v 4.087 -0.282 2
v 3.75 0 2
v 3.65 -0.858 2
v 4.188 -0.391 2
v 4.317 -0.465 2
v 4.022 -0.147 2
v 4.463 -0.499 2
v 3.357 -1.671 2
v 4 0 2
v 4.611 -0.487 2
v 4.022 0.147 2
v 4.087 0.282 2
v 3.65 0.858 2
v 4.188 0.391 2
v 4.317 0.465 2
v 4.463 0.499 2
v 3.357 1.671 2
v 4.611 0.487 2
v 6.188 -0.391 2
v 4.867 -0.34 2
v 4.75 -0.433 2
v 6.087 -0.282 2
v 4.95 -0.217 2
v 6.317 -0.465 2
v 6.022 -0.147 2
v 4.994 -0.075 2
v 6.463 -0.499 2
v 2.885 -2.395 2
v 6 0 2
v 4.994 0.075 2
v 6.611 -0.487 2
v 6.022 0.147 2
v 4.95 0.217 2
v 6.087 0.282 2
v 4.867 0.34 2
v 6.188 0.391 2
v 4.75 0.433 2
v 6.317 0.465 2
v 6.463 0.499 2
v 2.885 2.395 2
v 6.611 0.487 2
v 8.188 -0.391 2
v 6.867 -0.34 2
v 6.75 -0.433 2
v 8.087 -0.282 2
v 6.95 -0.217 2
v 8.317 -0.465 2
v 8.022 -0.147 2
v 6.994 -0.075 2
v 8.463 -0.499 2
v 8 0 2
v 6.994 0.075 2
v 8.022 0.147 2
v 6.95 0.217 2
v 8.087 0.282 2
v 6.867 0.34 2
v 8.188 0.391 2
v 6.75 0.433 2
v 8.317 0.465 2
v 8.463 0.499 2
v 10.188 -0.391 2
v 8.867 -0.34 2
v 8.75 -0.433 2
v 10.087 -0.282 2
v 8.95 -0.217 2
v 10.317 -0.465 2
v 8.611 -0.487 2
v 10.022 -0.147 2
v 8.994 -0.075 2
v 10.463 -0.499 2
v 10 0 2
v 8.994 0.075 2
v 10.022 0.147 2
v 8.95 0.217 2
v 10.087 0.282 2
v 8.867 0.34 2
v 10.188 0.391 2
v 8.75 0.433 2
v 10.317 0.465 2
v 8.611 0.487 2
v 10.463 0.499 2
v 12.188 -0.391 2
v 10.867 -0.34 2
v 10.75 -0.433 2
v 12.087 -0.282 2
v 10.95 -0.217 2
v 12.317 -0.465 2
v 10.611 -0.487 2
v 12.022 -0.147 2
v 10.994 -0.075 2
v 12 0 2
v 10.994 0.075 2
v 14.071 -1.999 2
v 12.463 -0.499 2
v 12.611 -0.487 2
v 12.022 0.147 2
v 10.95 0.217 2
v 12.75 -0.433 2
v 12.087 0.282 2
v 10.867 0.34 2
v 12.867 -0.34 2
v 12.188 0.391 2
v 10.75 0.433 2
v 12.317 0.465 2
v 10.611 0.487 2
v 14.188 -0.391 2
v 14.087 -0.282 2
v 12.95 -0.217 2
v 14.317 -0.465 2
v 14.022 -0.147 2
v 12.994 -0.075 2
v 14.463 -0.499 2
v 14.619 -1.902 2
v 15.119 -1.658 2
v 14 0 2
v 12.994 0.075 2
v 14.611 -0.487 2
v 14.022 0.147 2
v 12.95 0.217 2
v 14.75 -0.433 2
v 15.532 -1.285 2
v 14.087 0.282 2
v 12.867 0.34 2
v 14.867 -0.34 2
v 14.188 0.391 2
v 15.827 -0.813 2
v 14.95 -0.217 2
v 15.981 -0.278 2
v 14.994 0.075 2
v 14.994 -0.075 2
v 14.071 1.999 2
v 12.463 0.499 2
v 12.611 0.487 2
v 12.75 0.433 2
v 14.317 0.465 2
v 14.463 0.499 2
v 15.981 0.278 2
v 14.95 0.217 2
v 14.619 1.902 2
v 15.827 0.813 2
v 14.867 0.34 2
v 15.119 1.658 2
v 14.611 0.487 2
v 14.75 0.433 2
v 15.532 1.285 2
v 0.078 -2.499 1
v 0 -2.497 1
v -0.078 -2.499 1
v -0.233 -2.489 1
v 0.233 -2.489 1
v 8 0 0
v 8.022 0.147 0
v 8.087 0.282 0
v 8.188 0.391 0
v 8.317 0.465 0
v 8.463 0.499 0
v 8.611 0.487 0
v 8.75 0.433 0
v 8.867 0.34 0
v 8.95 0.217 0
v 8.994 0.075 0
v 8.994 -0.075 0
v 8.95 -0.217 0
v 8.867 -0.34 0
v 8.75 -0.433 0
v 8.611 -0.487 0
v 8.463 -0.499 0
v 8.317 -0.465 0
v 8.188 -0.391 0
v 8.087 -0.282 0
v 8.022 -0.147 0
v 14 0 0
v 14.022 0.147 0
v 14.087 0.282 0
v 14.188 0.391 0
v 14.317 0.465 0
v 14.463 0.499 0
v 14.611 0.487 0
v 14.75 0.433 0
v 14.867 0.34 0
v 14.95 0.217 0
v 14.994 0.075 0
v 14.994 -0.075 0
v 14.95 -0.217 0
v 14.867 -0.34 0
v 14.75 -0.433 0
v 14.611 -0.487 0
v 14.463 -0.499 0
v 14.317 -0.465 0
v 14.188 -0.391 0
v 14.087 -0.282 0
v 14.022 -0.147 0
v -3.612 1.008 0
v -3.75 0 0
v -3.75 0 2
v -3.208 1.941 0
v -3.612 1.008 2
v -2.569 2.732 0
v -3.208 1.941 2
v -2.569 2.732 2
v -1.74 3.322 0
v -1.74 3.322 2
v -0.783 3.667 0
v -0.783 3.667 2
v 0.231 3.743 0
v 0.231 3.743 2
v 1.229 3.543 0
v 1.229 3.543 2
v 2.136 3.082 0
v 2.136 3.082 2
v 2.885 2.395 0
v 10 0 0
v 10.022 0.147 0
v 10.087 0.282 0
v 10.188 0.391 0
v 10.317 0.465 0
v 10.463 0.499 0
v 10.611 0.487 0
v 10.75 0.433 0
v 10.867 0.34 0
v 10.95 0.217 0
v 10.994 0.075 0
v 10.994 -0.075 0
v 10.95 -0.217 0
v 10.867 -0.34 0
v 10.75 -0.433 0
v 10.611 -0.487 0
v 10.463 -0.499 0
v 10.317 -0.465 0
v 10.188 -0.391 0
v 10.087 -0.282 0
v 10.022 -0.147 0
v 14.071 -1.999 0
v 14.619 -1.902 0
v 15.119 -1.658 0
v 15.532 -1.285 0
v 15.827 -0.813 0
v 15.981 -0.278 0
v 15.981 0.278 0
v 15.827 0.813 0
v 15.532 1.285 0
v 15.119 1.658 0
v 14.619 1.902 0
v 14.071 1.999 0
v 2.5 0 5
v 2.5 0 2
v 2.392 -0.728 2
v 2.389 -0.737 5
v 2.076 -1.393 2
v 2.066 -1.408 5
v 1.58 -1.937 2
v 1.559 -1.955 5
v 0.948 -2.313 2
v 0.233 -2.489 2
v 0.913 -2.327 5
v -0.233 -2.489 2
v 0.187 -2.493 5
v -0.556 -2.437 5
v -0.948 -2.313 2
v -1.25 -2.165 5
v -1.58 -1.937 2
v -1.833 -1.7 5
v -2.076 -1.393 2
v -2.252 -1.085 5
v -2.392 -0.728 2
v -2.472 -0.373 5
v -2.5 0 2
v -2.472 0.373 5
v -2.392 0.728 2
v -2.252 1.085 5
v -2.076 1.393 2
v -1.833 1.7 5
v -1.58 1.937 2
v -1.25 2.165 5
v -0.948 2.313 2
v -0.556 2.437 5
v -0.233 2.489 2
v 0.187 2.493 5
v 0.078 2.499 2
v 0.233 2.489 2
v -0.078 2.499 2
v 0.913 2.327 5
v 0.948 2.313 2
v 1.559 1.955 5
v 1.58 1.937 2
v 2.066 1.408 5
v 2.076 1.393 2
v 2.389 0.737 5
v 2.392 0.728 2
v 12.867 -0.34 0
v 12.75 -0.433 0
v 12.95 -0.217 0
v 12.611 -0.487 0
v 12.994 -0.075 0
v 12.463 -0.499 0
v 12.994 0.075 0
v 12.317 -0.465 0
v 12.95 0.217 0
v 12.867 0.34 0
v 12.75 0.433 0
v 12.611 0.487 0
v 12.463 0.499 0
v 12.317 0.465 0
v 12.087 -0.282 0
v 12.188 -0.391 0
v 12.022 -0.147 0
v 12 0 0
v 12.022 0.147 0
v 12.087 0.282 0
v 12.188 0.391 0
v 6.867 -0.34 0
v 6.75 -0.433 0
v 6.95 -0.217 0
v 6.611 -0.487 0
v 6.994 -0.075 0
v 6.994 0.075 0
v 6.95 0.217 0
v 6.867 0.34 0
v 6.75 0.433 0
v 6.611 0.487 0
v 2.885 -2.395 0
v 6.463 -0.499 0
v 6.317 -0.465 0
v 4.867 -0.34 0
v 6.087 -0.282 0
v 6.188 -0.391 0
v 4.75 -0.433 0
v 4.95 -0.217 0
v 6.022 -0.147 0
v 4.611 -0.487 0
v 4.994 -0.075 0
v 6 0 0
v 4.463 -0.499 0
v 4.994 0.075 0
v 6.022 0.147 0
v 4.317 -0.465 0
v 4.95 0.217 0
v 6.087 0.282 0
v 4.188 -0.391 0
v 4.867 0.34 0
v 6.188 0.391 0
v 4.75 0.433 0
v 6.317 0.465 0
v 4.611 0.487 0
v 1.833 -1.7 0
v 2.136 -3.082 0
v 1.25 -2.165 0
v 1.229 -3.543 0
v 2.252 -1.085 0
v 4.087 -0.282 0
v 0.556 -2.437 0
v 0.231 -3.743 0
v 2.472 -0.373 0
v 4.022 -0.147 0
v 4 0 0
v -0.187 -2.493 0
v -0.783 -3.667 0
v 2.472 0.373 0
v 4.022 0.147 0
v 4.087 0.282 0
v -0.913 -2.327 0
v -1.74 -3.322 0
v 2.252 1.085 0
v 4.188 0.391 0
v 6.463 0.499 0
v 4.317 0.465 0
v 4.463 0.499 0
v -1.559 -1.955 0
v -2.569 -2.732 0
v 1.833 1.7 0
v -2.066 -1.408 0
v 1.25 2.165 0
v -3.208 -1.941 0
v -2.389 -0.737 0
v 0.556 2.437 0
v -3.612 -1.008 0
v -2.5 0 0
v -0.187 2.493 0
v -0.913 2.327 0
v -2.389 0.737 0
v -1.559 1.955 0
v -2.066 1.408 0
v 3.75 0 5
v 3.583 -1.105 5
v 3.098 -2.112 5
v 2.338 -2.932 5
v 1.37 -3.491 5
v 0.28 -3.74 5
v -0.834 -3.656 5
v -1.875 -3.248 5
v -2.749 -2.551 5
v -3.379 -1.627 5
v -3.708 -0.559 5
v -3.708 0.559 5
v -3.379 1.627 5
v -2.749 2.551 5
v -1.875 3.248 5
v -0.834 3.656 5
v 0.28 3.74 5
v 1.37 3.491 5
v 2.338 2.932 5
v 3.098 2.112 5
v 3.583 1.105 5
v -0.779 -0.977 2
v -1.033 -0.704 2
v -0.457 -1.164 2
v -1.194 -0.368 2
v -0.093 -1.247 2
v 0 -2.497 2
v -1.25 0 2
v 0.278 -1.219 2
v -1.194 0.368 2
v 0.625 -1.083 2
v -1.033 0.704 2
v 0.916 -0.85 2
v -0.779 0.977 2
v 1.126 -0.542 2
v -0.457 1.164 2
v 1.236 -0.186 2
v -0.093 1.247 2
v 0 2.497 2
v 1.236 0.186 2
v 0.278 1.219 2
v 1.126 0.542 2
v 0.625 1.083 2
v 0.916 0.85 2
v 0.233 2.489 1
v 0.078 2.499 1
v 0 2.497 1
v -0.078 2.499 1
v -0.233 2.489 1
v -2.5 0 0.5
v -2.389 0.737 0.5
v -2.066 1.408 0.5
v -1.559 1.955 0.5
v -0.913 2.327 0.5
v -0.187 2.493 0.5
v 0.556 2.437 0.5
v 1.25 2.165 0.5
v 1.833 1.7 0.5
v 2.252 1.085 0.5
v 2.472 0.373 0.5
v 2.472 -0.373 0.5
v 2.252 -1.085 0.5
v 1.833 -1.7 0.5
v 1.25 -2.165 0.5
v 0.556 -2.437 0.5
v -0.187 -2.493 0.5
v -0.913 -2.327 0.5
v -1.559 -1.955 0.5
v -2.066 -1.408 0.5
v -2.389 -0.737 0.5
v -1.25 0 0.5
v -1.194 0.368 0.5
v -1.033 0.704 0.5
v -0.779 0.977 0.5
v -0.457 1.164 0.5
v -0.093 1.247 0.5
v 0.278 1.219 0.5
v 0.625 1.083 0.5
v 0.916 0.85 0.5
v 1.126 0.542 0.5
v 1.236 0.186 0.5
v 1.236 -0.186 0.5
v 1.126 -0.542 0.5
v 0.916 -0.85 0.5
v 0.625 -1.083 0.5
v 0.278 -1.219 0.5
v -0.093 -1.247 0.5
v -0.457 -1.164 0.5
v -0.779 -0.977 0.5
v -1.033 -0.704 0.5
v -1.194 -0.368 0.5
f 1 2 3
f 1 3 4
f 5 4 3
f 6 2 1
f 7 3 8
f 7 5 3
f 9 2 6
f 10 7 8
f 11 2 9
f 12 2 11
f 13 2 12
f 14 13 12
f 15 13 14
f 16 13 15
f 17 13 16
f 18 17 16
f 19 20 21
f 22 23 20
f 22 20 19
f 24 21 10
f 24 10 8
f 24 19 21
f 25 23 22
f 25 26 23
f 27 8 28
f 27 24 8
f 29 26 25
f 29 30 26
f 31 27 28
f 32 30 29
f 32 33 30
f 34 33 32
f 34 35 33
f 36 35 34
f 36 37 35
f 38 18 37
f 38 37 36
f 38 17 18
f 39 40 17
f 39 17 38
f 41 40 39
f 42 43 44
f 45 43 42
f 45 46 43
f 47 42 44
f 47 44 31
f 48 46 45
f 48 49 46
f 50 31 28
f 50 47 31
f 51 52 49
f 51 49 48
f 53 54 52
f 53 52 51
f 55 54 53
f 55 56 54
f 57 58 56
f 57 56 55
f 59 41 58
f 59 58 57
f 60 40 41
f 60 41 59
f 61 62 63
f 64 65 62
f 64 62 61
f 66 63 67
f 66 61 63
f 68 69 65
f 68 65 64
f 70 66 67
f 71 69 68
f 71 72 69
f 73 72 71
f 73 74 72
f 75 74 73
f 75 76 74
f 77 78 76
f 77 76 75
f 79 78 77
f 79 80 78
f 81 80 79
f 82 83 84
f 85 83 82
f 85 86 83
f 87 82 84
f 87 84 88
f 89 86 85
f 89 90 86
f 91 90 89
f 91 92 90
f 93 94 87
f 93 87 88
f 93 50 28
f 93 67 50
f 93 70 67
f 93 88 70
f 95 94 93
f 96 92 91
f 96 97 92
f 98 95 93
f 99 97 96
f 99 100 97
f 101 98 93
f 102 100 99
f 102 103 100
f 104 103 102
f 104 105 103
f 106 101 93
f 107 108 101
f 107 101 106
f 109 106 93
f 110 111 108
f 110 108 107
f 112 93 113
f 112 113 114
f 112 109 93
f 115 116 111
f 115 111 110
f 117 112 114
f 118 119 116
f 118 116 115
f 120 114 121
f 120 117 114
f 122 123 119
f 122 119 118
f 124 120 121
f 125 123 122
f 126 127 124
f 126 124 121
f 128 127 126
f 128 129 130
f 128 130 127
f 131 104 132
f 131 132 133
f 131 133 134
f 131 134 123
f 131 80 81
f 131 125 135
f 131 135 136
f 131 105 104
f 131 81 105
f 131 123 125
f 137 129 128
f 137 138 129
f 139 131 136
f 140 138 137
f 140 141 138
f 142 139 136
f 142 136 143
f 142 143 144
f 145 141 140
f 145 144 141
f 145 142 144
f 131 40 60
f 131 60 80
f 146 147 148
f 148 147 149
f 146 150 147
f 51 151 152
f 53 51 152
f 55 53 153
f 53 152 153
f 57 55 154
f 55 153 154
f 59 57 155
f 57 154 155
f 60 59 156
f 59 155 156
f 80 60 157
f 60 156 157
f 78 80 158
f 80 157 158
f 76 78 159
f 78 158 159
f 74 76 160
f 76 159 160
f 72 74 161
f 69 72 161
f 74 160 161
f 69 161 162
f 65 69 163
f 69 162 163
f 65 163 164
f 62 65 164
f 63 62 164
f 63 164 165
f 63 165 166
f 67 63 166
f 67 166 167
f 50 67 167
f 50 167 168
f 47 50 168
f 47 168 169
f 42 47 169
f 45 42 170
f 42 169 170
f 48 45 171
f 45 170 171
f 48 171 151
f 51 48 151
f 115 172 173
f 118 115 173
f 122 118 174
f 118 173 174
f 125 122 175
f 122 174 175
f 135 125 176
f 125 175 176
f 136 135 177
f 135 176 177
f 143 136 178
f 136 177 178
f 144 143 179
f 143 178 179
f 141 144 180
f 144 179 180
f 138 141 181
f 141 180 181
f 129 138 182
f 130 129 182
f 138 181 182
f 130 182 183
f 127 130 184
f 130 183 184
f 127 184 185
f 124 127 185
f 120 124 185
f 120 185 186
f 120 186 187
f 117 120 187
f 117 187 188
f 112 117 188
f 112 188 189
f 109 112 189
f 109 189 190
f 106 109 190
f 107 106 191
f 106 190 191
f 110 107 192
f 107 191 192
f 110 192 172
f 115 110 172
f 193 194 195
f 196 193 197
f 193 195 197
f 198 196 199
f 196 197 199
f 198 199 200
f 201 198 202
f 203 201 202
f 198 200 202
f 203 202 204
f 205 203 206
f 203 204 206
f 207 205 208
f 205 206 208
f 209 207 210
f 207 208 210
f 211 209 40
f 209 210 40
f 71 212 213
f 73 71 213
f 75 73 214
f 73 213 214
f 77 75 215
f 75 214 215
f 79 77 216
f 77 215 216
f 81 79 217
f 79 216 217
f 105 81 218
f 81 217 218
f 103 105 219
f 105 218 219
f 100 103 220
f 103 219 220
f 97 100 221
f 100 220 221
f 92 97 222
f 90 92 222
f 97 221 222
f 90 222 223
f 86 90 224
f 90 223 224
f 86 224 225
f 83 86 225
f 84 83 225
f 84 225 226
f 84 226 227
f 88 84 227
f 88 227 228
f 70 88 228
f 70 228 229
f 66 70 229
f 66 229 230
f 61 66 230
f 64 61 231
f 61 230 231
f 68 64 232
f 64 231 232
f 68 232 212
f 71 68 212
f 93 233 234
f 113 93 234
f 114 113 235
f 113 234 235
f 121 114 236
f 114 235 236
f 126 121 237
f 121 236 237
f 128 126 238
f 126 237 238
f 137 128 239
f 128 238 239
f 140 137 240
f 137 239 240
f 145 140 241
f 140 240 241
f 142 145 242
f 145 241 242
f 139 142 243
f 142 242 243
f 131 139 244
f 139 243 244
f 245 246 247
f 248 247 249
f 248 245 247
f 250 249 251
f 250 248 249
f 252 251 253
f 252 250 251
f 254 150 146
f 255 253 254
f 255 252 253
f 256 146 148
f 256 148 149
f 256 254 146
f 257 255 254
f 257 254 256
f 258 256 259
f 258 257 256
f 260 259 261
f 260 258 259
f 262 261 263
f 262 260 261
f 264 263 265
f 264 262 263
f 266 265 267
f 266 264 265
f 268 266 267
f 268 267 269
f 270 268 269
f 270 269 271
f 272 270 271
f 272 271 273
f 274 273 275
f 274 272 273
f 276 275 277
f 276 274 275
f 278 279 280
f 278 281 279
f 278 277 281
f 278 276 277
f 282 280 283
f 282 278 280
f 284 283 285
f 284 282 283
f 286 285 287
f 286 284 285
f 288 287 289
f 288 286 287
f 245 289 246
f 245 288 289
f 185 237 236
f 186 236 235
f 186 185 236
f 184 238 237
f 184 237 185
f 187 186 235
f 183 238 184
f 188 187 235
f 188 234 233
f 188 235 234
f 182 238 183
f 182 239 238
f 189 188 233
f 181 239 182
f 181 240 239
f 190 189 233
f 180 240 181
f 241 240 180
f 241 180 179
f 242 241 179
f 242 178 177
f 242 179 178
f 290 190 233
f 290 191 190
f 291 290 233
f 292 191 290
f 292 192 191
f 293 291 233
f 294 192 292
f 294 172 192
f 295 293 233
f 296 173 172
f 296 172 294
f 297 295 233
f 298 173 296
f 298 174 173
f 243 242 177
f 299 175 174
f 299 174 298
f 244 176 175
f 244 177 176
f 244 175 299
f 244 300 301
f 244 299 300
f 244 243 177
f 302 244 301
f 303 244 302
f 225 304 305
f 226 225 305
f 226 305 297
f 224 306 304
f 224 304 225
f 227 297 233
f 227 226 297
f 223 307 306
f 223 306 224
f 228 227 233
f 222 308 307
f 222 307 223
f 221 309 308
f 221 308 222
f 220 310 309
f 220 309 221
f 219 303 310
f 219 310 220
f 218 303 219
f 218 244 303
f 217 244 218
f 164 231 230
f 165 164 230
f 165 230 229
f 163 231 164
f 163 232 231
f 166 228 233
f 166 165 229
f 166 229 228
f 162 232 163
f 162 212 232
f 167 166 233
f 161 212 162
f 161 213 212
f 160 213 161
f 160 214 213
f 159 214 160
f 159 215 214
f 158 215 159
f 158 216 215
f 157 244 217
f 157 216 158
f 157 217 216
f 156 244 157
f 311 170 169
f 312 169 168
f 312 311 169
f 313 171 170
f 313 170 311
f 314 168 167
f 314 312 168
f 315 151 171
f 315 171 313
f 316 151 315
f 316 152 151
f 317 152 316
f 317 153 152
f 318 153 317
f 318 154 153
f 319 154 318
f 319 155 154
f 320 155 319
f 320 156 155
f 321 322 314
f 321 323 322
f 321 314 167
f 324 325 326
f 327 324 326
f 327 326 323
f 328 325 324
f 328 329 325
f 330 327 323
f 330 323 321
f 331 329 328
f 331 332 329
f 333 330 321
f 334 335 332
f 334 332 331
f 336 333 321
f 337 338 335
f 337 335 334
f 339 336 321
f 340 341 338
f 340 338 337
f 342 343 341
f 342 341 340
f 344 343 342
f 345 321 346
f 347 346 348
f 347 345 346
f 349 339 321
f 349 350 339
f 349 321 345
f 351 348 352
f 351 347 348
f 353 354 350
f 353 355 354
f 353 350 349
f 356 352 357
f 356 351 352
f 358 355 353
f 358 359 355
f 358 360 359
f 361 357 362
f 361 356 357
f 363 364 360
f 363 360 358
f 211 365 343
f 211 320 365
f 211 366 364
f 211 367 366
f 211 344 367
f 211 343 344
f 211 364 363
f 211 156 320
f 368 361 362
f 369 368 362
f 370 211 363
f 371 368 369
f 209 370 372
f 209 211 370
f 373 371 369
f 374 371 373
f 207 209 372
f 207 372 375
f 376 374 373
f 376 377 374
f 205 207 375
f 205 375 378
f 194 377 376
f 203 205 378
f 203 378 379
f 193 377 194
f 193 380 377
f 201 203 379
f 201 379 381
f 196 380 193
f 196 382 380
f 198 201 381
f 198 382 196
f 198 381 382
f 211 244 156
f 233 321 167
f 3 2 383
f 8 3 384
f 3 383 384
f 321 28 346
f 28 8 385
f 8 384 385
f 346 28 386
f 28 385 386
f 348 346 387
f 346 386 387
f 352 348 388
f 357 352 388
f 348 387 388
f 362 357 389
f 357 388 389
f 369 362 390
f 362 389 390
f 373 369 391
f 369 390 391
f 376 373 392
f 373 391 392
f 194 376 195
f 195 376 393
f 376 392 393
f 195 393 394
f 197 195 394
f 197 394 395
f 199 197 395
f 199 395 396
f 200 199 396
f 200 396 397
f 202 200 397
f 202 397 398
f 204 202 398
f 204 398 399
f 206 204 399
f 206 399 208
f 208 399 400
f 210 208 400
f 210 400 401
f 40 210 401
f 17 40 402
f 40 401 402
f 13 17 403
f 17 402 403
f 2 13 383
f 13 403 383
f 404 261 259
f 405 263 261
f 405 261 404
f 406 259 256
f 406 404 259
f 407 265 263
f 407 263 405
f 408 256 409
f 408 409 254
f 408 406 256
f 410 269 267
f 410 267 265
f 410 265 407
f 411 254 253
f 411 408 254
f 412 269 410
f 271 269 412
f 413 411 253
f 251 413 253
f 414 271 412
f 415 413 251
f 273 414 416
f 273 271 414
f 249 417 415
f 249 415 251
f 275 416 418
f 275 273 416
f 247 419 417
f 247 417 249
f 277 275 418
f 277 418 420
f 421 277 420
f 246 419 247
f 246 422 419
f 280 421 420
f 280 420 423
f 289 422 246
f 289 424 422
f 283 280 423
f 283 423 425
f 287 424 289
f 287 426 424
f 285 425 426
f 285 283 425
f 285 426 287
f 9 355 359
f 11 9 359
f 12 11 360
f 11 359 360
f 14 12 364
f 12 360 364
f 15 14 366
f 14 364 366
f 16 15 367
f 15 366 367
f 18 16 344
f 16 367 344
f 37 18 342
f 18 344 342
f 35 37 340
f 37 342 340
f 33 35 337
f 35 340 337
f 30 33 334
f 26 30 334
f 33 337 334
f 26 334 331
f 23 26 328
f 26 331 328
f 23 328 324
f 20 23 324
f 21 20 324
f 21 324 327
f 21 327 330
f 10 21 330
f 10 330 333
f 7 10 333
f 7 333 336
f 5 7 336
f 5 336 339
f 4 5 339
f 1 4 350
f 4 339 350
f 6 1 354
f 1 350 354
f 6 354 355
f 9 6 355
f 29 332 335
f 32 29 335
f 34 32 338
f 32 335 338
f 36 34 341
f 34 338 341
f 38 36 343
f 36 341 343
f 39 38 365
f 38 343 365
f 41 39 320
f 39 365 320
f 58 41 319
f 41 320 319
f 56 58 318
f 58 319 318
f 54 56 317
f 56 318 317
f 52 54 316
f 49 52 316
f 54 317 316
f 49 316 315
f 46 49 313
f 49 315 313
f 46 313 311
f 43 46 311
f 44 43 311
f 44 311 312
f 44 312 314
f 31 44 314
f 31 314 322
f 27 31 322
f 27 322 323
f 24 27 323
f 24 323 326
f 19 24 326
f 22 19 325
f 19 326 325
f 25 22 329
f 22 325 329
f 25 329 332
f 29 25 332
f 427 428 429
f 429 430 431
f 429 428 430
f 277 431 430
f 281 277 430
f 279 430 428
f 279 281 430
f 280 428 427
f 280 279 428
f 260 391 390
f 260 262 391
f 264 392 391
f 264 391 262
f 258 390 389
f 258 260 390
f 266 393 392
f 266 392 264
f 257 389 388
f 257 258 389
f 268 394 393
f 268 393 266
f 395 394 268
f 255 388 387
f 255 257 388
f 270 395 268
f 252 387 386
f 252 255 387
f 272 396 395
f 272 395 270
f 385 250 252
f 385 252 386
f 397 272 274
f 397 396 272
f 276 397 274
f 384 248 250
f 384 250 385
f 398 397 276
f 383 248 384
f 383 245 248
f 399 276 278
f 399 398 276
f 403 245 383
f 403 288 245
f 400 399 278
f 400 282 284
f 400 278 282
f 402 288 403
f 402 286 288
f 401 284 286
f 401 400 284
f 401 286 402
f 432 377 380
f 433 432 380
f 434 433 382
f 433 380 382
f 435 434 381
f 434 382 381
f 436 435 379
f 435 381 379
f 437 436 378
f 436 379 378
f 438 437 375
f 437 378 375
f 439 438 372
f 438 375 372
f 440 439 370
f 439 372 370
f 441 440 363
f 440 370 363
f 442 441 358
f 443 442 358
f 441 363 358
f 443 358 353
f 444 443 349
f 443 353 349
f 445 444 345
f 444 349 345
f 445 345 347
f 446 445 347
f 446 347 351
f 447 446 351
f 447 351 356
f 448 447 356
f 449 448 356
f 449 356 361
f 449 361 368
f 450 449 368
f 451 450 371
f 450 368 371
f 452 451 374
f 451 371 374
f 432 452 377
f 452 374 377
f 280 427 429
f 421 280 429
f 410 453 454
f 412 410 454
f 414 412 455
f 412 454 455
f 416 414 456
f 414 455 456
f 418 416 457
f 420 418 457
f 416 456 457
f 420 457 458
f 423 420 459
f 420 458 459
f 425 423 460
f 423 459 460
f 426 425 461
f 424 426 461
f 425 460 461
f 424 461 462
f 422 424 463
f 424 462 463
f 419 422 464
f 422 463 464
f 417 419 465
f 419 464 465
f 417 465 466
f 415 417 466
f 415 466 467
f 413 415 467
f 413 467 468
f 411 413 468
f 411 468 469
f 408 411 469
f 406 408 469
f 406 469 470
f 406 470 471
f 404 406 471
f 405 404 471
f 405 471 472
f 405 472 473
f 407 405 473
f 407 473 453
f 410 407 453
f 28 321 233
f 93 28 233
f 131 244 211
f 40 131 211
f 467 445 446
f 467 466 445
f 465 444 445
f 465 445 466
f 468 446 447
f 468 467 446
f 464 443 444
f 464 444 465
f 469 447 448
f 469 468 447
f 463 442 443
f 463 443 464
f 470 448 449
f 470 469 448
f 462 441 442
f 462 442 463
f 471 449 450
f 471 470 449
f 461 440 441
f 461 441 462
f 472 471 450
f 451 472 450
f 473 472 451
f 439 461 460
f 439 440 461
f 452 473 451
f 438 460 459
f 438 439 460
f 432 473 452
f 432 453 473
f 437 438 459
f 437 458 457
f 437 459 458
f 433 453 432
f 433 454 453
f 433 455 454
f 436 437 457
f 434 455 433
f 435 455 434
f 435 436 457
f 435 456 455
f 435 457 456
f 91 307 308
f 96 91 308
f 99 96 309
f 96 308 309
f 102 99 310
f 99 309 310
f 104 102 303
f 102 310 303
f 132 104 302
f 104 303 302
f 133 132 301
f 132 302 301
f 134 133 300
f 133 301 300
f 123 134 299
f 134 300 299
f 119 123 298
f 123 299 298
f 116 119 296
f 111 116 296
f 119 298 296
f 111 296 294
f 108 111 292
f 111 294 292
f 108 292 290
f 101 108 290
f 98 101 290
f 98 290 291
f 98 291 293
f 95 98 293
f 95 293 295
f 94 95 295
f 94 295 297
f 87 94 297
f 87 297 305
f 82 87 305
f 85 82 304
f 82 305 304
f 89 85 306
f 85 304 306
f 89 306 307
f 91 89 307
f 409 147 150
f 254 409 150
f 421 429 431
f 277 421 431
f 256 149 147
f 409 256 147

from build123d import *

# Parameters (mm, degrees)
EXTRUDE_3_DEPTH     = 2
EXTRUDE_3_2_DEPTH   = 2
SKETCH_2_R          = 3.75
SKETCH_2_R_2        = 2.5
EXTRUDE_5_DEPTH     = 3
SKETCH_3_R          = 3.75
SKETCH_3_R_2        = 2.5
EXTRUDE_6_DEPTH     = 2
SKETCH_4_R          = 0.5
CUT_EXTRUDE_1_DEPTH = 2
SKETCH_5_R          = 2.5
EXTRUDE_7_DEPTH     = 1
SKETCH_6_R          = 2.5
CUT_EXTRUDE_2_DEPTH = 0.5
SKETCH_7_R          = 1.25
CUT_EXTRUDE_3_DEPTH = 5


with BuildPart() as part:
    # Эскиз1 → Бобышка-Вытянуть3 (new body)
    with BuildSketch(Plane.XY):
        with BuildLine():
            ThreePointArc((-0.233236, 2.489096416), (-1.84838984, 1.683286963), (-2.5, 0))
            ThreePointArc((-2.5, 0), (-1.84838984, -1.683286963), (-0.233236, -2.489096416))
            Line((-0.233236, -2.489096416), (0, -2.497361401))
            Line((0, -2.497361401), (0.233236, -2.489096416))
            ThreePointArc((0.233236, -2.489096416), (2.5, 0), (0.233236, 2.489096416))
            Line((0.233236, 2.489096416), (0, 2.497361401))
            Line((0, 2.497361401), (-0.233236, 2.489096416))
        make_face()
    extrude(amount=EXTRUDE_3_DEPTH)



with BuildPart() as body_2:
    # Эскиз1 → Extrude 3 2 (new body)
    with BuildSketch(Plane.XY):
        with BuildLine():
            Line((14.07082784, 1.998745461), (2.88547071, 2.395111434))
            ThreePointArc((2.88547071, 2.395111434), (3.75, 0), (2.88547071, -2.395111434))
            Line((2.88547071, -2.395111434), (14.07082784, -1.998745461))
            ThreePointArc((14.07082784, -1.998745461), (16, 0), (14.07082784, 1.998745461))
        make_face()
    extrude(amount=EXTRUDE_3_2_DEPTH)


with BuildPart() as body_3:
    # Эскиз2 → Бобышка-Вытянуть5 (new body)
    with BuildSketch(Plane.XY.offset(2)):
        Circle(SKETCH_2_R)
        Circle(SKETCH_2_R_2, mode=Mode.SUBTRACT)
    extrude(amount=EXTRUDE_5_DEPTH)


with BuildPart() as part_1:
    add(part.part)

    add(body_2.part)  # Бобышка-Вытянуть6 merges body 2

    add(body_3.part)  # Бобышка-Вытянуть6 merges body 3
    # Эскиз3 → Бобышка-Вытянуть6 (add)
    with BuildSketch(Plane(origin=(0, 0, 2), x_dir=(-1, 0, 0), z_dir=(0, 0, -1))):
        Circle(SKETCH_3_R)
        Circle(SKETCH_3_R_2, mode=Mode.SUBTRACT)
    extrude(amount=EXTRUDE_6_DEPTH)

    # Эскиз4 → Вырез-Вытянуть1 (cut)
    with BuildSketch(Plane(origin=(0, 0, 0), x_dir=(-1, 0, 0), z_dir=(0, 0, -1))):
        with Locations((-14.5, 0)):
            Circle(SKETCH_4_R)
        with Locations((-4.5, 0)):
            Circle(SKETCH_4_R)
        with Locations((-6.5, 0)):
            Circle(SKETCH_4_R)
        with Locations((-8.5, 0)):
            Circle(SKETCH_4_R)
        with Locations((-10.5, 0)):
            Circle(SKETCH_4_R)
        with Locations((-12.5, 0)):
            Circle(SKETCH_4_R)
    extrude(amount=-CUT_EXTRUDE_1_DEPTH, mode=Mode.SUBTRACT)

    # Эскиз5 → Бобышка-Вытянуть7 (add)
    with BuildSketch(Plane(origin=(0, 0, 0), x_dir=(-1, 0, 0), z_dir=(0, 0, -1))):
        Circle(SKETCH_5_R)
    extrude(amount=-EXTRUDE_7_DEPTH)

    # Эскиз6 → Вырез-Вытянуть2 (cut)
    with BuildSketch(Plane(origin=(0, 0, 0), x_dir=(-1, 0, 0), z_dir=(0, 0, -1))):
        Circle(SKETCH_6_R)
    extrude(amount=-CUT_EXTRUDE_2_DEPTH, mode=Mode.SUBTRACT)

    # Эскиз7 → Вырез-Вытянуть3 (cut)
    with BuildSketch(Plane(origin=(0, 0, 0.5), x_dir=(-1, 0, 0), z_dir=(0, 0, -1))):
        Circle(SKETCH_7_R)
    extrude(amount=-CUT_EXTRUDE_3_DEPTH, mode=Mode.SUBTRACT)


solid = part_1.part
